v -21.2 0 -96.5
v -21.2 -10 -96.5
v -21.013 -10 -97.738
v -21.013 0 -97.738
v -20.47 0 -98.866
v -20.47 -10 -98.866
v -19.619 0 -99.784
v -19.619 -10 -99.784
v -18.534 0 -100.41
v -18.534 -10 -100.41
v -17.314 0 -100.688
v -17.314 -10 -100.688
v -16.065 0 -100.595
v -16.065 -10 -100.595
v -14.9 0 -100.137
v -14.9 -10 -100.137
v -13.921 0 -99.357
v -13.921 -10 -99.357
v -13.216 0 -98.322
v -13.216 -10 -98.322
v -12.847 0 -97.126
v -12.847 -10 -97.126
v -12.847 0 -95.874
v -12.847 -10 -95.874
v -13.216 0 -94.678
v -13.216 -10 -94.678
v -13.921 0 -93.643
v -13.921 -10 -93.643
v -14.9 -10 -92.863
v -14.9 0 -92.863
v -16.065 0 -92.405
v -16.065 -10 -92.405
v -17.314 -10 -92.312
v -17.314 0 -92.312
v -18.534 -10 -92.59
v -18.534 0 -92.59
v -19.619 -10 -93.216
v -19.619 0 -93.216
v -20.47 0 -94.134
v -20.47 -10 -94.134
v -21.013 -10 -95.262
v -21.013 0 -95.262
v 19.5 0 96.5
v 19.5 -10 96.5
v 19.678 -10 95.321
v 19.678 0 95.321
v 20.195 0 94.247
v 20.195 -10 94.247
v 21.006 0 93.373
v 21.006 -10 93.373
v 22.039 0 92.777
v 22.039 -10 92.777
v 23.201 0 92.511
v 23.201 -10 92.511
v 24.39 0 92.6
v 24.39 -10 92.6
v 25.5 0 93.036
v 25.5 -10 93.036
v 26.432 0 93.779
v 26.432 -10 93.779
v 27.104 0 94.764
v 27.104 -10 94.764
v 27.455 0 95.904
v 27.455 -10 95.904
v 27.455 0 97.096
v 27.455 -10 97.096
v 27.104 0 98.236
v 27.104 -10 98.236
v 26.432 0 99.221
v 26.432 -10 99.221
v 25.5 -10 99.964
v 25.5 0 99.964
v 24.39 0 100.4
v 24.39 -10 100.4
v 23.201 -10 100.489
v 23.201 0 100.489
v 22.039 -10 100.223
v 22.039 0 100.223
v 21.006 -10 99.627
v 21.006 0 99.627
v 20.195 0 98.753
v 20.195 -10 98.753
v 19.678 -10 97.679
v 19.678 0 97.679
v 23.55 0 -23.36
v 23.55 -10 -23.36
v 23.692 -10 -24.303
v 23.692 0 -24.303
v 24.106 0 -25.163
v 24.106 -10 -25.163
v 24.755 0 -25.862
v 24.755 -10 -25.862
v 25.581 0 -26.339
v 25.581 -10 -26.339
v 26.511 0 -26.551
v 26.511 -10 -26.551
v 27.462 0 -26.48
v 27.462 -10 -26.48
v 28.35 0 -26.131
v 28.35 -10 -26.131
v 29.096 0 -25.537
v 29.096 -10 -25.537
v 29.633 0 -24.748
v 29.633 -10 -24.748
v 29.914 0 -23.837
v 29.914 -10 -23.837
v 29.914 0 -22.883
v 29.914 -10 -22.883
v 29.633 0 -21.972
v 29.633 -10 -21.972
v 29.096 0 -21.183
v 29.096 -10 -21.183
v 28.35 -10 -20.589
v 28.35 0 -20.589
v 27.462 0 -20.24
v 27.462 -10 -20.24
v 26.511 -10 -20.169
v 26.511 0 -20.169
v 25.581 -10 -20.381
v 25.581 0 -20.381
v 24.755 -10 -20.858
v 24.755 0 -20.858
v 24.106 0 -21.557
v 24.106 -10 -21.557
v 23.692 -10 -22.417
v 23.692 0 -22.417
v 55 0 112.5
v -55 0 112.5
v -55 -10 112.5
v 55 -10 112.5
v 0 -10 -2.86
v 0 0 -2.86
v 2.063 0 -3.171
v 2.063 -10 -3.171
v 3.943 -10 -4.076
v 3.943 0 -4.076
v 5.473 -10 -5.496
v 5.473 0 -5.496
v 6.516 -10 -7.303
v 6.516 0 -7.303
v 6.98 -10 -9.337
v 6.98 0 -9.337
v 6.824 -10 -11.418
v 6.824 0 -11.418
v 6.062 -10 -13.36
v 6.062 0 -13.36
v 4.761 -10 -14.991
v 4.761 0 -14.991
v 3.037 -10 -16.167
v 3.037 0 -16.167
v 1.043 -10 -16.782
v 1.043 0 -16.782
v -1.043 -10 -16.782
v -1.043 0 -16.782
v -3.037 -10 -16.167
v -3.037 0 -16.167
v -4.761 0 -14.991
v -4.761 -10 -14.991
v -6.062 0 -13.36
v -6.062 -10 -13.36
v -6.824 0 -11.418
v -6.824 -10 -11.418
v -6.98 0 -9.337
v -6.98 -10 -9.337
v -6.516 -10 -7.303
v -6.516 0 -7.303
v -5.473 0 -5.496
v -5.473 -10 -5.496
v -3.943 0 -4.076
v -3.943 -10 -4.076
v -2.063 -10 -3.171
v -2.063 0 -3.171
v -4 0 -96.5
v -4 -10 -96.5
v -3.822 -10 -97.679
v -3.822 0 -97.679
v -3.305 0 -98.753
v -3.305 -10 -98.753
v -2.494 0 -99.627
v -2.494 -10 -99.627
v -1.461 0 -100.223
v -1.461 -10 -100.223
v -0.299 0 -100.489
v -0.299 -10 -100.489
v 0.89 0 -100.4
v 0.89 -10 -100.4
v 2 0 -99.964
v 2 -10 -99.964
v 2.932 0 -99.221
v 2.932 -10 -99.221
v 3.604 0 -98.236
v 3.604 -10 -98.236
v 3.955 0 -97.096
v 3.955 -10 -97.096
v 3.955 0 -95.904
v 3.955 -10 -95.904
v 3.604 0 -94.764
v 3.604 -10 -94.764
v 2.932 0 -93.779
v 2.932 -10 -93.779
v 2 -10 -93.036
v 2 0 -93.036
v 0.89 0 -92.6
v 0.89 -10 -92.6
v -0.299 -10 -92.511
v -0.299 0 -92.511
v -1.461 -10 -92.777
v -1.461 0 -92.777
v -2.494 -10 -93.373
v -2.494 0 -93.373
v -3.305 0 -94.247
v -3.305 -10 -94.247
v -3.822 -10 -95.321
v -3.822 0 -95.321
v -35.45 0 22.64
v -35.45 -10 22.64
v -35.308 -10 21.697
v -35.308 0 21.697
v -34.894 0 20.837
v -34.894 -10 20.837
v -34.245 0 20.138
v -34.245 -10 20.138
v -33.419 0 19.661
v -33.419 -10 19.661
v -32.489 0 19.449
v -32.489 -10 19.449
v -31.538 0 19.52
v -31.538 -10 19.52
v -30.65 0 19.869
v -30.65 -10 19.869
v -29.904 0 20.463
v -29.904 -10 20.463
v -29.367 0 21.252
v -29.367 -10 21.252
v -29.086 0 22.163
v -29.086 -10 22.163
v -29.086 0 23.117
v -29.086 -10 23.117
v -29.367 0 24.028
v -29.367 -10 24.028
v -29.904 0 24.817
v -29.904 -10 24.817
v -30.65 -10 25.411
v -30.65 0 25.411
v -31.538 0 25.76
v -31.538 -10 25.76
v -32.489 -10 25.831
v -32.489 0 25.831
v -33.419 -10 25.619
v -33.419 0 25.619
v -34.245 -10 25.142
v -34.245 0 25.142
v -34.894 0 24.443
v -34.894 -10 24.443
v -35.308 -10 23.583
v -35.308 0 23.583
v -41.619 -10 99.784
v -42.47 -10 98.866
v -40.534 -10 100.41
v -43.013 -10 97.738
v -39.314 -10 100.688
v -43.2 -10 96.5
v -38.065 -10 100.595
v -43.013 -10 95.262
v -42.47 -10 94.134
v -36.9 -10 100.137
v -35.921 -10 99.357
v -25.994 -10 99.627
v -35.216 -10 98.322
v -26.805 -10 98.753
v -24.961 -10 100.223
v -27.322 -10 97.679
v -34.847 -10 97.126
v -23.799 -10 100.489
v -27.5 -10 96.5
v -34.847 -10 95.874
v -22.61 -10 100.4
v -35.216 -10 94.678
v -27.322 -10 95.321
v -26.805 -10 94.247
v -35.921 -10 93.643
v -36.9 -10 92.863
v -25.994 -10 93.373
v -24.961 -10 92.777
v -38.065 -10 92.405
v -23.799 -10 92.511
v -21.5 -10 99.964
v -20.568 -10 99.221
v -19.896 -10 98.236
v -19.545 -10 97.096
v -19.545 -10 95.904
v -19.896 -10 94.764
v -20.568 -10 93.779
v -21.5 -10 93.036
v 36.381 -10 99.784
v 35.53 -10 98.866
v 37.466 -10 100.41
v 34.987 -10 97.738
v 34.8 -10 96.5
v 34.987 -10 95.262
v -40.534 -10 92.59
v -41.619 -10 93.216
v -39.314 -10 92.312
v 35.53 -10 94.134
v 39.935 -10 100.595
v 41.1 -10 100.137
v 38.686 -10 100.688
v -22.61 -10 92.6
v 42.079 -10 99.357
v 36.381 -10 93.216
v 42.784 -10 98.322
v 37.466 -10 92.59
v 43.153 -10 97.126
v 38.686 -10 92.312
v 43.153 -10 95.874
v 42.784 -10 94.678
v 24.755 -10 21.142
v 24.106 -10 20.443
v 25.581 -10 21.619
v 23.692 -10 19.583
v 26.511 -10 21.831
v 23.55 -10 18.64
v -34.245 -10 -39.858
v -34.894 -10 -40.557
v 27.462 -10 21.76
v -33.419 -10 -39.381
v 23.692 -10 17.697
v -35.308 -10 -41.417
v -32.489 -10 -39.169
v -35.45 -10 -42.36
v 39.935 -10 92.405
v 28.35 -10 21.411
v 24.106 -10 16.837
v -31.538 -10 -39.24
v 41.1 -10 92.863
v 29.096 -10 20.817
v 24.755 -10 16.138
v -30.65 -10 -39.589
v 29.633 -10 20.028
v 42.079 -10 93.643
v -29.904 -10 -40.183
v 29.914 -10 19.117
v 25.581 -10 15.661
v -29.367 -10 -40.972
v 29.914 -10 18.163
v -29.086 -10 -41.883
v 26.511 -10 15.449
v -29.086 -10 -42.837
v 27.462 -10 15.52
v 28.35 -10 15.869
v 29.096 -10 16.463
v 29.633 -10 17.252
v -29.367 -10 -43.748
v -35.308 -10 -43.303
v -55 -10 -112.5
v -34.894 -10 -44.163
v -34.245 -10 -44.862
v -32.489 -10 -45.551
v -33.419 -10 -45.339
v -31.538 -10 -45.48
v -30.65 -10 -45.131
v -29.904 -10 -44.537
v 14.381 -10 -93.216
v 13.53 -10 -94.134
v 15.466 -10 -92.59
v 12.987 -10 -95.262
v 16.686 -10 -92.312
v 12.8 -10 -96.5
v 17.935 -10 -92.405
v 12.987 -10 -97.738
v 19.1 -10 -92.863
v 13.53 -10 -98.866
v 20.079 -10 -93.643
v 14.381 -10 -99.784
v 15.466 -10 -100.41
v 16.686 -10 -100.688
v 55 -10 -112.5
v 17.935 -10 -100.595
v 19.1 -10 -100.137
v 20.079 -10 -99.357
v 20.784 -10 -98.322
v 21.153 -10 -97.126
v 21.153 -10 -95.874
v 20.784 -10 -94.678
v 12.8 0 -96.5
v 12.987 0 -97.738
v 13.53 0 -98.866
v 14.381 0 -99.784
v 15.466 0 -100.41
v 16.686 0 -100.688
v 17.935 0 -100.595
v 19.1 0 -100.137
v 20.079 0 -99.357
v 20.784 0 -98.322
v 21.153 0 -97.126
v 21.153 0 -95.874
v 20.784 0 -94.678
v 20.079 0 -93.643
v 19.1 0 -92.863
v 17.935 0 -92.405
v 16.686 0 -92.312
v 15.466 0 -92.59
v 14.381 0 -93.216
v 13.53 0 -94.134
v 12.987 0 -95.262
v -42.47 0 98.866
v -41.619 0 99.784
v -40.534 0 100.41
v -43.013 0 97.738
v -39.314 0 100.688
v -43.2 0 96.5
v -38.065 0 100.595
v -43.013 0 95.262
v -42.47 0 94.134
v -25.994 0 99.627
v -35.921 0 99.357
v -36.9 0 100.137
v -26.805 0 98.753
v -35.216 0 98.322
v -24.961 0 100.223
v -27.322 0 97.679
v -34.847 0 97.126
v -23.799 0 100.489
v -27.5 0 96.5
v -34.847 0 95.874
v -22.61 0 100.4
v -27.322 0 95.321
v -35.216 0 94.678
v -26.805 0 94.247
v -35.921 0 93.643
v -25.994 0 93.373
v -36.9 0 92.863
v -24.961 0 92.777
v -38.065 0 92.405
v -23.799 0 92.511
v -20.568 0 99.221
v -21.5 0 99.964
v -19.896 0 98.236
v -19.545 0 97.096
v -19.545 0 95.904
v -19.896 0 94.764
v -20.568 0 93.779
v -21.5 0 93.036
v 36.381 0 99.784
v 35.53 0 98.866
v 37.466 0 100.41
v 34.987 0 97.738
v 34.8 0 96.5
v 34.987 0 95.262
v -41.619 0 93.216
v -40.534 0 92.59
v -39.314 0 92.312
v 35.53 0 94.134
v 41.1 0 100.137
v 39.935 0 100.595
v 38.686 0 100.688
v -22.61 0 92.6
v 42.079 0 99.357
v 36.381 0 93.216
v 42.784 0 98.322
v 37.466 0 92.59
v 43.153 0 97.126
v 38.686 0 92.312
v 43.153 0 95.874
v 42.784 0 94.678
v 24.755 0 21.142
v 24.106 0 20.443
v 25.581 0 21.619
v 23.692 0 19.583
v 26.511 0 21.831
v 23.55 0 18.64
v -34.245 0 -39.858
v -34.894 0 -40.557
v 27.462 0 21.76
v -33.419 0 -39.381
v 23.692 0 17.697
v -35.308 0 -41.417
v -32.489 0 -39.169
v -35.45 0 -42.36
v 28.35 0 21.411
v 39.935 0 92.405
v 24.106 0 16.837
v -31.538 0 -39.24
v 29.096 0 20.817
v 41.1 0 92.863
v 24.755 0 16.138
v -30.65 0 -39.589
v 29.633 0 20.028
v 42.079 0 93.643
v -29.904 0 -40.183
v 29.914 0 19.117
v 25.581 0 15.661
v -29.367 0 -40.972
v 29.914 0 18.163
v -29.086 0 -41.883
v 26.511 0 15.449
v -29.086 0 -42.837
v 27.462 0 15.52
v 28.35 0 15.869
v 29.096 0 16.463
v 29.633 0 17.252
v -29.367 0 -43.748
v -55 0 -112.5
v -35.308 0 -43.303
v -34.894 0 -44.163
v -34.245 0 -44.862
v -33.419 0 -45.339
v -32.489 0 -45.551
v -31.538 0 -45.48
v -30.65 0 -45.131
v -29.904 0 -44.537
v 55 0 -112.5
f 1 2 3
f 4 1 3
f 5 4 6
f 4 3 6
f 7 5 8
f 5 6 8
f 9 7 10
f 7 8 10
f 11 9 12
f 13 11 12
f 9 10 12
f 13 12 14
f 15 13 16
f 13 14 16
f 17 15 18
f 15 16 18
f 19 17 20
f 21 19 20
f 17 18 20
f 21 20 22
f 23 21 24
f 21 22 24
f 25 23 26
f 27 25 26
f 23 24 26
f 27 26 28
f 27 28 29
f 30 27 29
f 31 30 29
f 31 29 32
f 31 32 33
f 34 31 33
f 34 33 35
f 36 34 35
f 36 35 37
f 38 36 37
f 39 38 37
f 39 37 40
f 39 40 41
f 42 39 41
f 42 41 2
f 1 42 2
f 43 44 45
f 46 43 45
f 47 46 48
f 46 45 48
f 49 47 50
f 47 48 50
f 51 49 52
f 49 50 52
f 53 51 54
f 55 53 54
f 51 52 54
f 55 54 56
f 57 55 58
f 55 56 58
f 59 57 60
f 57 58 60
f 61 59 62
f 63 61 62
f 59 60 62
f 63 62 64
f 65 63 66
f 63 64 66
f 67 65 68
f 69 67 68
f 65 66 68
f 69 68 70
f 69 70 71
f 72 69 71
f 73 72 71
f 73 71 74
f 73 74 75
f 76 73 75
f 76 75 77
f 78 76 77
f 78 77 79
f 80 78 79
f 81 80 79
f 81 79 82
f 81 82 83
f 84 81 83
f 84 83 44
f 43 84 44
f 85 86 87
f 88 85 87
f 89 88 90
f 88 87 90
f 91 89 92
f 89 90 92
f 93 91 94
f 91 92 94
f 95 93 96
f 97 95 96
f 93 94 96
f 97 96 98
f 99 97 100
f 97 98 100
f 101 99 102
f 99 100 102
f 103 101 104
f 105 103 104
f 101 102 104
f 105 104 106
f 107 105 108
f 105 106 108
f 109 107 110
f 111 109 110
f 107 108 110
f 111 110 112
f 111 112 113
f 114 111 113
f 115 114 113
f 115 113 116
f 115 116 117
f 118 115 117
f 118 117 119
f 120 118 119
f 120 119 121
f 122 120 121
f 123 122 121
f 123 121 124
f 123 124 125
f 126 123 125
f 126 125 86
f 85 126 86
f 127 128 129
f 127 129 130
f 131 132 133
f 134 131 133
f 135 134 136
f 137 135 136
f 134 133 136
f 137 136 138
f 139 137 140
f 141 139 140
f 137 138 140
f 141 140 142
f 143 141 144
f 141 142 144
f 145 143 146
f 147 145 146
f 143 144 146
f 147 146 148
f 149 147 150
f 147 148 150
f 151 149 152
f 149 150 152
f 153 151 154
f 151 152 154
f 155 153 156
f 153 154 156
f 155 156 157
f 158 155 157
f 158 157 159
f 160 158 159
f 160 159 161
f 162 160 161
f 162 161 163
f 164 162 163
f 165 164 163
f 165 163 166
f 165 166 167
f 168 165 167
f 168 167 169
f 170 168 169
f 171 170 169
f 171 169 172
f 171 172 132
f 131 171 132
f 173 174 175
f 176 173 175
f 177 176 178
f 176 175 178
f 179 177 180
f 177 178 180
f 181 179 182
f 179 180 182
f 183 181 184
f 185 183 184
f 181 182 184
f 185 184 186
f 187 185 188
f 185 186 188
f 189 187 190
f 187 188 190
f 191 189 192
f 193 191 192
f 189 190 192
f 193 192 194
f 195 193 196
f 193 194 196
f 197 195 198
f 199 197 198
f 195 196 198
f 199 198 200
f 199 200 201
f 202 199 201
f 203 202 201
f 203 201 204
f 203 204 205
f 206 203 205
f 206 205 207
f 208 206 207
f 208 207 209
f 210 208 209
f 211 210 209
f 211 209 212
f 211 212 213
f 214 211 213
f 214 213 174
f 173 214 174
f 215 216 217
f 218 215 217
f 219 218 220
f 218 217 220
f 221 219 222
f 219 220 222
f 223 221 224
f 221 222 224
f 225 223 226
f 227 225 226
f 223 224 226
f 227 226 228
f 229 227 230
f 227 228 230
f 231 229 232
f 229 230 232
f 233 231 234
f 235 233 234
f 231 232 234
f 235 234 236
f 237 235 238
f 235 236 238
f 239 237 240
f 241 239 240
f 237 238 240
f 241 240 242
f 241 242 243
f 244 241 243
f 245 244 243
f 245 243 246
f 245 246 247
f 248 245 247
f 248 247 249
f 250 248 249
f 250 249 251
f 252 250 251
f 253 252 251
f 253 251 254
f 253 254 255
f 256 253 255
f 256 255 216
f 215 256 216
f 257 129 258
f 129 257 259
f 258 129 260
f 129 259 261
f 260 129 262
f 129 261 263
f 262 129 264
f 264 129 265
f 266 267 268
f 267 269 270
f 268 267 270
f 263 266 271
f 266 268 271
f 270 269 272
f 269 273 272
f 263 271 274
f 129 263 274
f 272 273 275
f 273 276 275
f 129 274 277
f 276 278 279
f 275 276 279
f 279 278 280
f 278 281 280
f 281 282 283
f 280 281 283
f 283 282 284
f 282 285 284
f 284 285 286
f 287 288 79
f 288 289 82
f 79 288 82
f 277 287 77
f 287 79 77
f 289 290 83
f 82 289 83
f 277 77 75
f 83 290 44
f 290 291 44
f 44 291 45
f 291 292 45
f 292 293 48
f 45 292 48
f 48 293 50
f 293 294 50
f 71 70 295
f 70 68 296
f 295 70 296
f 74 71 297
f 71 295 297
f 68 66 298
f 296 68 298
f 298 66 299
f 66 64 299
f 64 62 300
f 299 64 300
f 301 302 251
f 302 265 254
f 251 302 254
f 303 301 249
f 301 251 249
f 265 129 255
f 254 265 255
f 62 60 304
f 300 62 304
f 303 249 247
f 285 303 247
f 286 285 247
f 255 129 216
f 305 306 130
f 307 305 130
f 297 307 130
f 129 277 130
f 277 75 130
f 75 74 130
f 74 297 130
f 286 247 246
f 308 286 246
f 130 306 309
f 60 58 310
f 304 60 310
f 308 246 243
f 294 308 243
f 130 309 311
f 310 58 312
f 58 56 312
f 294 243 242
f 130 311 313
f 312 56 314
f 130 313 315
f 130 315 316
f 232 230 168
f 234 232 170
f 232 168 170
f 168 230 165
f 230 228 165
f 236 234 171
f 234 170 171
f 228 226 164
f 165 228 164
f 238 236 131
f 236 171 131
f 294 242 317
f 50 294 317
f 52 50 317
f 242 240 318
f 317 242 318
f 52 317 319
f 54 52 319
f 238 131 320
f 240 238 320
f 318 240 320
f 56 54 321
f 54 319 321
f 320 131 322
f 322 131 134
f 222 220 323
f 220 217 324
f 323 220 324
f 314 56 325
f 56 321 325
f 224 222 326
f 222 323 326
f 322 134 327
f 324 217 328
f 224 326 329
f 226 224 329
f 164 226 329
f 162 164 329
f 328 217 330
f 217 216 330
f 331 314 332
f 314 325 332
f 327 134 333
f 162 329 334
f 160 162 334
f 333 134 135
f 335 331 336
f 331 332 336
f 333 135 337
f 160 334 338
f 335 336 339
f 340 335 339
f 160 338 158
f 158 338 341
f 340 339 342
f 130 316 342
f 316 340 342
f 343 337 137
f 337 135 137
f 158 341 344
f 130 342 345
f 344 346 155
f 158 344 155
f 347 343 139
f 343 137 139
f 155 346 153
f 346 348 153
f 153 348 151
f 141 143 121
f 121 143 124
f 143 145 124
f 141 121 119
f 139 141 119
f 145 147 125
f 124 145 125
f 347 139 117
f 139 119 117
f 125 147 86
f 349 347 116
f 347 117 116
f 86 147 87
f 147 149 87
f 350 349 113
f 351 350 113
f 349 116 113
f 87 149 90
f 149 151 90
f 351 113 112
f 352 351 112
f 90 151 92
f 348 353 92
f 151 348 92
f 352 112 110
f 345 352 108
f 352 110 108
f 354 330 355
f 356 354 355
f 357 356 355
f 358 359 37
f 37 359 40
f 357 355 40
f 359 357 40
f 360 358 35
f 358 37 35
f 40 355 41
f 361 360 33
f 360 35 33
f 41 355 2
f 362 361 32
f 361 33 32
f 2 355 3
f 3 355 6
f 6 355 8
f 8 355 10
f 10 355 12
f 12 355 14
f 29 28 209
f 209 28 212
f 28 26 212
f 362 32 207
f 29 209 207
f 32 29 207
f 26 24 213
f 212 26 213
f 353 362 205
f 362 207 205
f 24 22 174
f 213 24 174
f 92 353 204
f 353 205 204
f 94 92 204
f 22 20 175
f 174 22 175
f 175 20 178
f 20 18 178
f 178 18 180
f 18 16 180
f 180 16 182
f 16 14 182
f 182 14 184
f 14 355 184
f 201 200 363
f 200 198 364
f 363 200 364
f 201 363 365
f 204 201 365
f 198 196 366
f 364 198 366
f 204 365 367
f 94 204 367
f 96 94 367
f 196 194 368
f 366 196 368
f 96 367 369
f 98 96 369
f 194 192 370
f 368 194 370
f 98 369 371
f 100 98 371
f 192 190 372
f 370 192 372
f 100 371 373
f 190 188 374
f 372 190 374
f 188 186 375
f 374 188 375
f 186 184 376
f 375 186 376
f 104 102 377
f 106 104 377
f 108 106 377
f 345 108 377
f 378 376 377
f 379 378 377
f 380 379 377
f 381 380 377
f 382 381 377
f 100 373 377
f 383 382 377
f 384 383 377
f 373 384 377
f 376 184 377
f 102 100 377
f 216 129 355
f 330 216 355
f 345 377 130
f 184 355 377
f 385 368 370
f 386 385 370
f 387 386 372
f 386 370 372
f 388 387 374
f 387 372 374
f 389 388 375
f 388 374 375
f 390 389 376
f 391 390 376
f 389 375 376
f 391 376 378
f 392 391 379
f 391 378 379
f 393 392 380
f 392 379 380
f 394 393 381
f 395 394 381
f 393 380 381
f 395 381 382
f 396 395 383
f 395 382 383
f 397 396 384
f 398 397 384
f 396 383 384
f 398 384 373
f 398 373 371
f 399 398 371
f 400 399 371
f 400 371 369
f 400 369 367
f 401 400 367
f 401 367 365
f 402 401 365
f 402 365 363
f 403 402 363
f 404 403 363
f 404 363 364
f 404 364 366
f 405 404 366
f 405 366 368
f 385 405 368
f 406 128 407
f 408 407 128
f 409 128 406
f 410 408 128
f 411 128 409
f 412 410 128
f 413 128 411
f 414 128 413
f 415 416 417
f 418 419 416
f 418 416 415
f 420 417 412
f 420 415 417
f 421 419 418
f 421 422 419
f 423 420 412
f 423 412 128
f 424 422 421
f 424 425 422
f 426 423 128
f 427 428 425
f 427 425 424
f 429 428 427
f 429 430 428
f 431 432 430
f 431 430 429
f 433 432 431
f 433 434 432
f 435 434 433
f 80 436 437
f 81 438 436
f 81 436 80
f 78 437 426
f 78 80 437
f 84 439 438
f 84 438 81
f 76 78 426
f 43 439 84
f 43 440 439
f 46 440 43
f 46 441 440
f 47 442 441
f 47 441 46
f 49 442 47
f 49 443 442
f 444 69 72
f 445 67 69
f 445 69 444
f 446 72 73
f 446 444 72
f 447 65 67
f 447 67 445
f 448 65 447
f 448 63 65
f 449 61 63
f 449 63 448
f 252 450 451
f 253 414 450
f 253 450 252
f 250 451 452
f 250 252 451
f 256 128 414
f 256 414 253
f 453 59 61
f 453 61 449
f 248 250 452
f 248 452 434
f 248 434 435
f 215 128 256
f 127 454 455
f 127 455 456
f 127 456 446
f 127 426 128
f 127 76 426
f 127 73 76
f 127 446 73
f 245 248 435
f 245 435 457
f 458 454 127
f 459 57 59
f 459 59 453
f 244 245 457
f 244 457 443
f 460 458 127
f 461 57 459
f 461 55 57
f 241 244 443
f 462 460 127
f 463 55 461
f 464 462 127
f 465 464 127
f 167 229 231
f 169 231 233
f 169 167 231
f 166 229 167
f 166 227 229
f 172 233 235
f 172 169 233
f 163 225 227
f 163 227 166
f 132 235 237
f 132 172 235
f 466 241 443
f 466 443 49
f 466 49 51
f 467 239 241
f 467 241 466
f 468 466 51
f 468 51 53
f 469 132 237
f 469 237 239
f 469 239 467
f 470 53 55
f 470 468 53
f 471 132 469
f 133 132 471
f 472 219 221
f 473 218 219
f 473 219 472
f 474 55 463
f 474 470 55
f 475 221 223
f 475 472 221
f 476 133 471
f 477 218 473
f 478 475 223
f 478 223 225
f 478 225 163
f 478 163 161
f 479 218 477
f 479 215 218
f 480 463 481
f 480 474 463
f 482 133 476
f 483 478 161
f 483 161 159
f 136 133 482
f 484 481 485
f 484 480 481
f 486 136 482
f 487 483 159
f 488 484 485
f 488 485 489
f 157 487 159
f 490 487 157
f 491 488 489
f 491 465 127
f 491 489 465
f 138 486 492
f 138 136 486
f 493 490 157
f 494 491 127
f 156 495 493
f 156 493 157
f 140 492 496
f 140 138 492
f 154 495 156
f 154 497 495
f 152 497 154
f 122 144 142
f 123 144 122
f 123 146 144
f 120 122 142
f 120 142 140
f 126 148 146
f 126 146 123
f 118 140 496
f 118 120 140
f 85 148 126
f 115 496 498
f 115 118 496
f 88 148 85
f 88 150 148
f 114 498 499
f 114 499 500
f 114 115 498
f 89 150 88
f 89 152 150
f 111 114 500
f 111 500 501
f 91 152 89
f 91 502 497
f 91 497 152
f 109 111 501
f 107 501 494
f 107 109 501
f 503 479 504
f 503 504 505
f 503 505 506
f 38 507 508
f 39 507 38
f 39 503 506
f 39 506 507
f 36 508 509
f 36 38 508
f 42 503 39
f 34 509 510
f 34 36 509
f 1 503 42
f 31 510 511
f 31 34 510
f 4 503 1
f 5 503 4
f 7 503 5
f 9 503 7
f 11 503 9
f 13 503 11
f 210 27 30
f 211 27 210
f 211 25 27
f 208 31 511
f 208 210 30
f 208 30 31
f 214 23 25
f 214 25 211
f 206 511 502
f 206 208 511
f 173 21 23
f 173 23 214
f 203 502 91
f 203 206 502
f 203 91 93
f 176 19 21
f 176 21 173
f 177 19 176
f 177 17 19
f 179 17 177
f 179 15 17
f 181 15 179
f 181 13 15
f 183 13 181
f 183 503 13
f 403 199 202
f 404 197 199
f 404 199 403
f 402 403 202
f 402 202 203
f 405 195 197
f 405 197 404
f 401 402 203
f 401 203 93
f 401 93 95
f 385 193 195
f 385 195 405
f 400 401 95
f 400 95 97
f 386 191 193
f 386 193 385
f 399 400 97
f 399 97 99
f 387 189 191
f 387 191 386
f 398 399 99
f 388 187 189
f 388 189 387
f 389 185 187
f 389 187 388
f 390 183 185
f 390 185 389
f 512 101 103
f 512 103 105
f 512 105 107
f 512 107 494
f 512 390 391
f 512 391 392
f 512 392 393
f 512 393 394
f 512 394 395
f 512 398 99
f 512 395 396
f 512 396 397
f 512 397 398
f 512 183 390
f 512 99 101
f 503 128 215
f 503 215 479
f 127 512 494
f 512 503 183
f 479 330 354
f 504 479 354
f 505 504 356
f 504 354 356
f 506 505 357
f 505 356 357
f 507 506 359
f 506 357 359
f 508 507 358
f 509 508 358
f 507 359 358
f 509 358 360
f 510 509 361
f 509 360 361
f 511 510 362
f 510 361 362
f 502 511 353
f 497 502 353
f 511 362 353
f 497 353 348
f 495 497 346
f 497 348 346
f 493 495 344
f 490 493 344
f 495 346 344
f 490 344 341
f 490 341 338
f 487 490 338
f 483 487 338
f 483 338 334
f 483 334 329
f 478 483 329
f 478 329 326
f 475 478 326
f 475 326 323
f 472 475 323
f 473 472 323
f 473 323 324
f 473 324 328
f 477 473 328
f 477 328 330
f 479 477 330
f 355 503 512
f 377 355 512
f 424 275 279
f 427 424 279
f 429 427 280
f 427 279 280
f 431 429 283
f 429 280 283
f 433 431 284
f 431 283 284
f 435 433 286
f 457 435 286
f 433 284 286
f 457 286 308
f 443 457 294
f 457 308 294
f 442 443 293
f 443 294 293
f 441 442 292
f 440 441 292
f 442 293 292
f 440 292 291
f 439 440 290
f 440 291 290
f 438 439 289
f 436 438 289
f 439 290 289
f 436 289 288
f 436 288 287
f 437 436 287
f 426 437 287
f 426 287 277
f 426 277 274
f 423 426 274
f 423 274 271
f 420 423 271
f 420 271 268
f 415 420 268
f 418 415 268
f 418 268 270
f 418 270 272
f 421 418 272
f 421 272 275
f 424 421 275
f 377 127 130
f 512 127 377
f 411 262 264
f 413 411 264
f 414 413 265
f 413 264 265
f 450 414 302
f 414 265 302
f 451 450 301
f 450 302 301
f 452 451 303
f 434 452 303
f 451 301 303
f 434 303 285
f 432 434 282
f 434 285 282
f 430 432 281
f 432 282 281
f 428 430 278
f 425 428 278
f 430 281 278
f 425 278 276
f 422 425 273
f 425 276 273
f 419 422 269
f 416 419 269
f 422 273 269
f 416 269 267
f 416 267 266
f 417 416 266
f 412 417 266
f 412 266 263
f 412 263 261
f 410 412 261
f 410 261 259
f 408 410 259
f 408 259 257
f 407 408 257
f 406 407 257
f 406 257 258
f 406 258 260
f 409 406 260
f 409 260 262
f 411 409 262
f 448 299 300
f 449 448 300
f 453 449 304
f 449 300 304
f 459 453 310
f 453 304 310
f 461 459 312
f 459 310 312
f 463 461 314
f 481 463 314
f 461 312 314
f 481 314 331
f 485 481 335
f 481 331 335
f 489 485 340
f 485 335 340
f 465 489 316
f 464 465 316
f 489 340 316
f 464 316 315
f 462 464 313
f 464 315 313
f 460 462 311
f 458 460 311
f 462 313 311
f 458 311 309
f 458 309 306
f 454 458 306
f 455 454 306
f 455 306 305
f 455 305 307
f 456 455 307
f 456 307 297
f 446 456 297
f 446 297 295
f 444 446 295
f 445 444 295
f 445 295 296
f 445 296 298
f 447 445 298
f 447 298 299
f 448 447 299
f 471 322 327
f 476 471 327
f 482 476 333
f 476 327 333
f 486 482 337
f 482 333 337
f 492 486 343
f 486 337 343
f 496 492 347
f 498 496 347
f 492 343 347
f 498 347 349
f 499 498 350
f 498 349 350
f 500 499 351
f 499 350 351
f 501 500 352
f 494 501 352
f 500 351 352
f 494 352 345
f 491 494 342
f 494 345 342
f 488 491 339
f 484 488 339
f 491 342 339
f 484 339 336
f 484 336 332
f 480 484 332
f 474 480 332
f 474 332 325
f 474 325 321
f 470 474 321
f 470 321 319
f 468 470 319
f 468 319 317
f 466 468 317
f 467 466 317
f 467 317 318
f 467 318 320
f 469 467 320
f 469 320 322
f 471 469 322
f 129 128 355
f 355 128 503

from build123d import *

# Parameters (mm, degrees)
SKETCH1_W             = 110
SKETCH1_H             = 225
BOSS_EXTRUDE1_DEPTH   = 10
M8_CLEARANCE_HOLE1_D  = 8.4
F_8_0MM_DOWEL_HOLE1_D = 8
CUT_EXTRUDE1_REACH    = 127.623
SKETCH8_R             = 7
M6_CLEARANCE_HOLE1_D  = 6.4


with BuildPart() as part:
    # Sketch1 → Boss-Extrude1 (new body)
    with BuildSketch(Plane(origin=(0, 0, 0), x_dir=(1, 0, 0), z_dir=(0, 1, 0))):
        Rectangle(SKETCH1_W, SKETCH1_H)
    extrude(amount=-BOSS_EXTRUDE1_DEPTH)

    # M8 Clearance Hole1 (through all)
    with Locations(Plane(origin=(0, 0, 0), x_dir=(1, 0, 0), z_dir=(0, 1, 0))):
        with Locations((-17, 96.5), (17, 96.5), (-39, -96.5), (39, -96.5)):
            Hole(M8_CLEARANCE_HOLE1_D / 2)

    # Ø8.0mm Dowel Hole1 (through all)
    with Locations(Plane(origin=(0, 0, 0), x_dir=(1, 0, 0), z_dir=(0, 1, 0))):
        with Locations((0, 96.5), (-23.5, -96.5), (23.5, -96.5)):
            Hole(F_8_0MM_DOWEL_HOLE1_D / 2)

    # Sketch8 → Cut-Extrude1 (cut, up to next)
    with BuildSketch(Plane(origin=(0, 0, 0), x_dir=(1, 0, 0), z_dir=(0, 1, 0)), mode=Mode.PRIVATE) as cut_extrude1_sk1:
        with Locations(Location((0, 9.86, 0), (0, 0, 270))):
            Circle(SKETCH8_R)
    cut_extrude1_tool1 = extrude(cut_extrude1_sk1.sketch, amount=-CUT_EXTRUDE1_REACH, mode=Mode.PRIVATE) & part.part
    add(cut_extrude1_tool1.solids().sort_by_distance((0, 0, -9.86))[0], mode=Mode.SUBTRACT)

    # M6 Clearance Hole1 (through all)
    with Locations(Plane(origin=(0, 0, 0), x_dir=(1, 0, 0), z_dir=(0, 1, 0))):
        with Locations((26.75, 23.36), (26.75, -18.64), (-32.25, 42.36), (-32.25, -22.64)):
            Hole(M6_CLEARANCE_HOLE1_D / 2)


solid = part.part
